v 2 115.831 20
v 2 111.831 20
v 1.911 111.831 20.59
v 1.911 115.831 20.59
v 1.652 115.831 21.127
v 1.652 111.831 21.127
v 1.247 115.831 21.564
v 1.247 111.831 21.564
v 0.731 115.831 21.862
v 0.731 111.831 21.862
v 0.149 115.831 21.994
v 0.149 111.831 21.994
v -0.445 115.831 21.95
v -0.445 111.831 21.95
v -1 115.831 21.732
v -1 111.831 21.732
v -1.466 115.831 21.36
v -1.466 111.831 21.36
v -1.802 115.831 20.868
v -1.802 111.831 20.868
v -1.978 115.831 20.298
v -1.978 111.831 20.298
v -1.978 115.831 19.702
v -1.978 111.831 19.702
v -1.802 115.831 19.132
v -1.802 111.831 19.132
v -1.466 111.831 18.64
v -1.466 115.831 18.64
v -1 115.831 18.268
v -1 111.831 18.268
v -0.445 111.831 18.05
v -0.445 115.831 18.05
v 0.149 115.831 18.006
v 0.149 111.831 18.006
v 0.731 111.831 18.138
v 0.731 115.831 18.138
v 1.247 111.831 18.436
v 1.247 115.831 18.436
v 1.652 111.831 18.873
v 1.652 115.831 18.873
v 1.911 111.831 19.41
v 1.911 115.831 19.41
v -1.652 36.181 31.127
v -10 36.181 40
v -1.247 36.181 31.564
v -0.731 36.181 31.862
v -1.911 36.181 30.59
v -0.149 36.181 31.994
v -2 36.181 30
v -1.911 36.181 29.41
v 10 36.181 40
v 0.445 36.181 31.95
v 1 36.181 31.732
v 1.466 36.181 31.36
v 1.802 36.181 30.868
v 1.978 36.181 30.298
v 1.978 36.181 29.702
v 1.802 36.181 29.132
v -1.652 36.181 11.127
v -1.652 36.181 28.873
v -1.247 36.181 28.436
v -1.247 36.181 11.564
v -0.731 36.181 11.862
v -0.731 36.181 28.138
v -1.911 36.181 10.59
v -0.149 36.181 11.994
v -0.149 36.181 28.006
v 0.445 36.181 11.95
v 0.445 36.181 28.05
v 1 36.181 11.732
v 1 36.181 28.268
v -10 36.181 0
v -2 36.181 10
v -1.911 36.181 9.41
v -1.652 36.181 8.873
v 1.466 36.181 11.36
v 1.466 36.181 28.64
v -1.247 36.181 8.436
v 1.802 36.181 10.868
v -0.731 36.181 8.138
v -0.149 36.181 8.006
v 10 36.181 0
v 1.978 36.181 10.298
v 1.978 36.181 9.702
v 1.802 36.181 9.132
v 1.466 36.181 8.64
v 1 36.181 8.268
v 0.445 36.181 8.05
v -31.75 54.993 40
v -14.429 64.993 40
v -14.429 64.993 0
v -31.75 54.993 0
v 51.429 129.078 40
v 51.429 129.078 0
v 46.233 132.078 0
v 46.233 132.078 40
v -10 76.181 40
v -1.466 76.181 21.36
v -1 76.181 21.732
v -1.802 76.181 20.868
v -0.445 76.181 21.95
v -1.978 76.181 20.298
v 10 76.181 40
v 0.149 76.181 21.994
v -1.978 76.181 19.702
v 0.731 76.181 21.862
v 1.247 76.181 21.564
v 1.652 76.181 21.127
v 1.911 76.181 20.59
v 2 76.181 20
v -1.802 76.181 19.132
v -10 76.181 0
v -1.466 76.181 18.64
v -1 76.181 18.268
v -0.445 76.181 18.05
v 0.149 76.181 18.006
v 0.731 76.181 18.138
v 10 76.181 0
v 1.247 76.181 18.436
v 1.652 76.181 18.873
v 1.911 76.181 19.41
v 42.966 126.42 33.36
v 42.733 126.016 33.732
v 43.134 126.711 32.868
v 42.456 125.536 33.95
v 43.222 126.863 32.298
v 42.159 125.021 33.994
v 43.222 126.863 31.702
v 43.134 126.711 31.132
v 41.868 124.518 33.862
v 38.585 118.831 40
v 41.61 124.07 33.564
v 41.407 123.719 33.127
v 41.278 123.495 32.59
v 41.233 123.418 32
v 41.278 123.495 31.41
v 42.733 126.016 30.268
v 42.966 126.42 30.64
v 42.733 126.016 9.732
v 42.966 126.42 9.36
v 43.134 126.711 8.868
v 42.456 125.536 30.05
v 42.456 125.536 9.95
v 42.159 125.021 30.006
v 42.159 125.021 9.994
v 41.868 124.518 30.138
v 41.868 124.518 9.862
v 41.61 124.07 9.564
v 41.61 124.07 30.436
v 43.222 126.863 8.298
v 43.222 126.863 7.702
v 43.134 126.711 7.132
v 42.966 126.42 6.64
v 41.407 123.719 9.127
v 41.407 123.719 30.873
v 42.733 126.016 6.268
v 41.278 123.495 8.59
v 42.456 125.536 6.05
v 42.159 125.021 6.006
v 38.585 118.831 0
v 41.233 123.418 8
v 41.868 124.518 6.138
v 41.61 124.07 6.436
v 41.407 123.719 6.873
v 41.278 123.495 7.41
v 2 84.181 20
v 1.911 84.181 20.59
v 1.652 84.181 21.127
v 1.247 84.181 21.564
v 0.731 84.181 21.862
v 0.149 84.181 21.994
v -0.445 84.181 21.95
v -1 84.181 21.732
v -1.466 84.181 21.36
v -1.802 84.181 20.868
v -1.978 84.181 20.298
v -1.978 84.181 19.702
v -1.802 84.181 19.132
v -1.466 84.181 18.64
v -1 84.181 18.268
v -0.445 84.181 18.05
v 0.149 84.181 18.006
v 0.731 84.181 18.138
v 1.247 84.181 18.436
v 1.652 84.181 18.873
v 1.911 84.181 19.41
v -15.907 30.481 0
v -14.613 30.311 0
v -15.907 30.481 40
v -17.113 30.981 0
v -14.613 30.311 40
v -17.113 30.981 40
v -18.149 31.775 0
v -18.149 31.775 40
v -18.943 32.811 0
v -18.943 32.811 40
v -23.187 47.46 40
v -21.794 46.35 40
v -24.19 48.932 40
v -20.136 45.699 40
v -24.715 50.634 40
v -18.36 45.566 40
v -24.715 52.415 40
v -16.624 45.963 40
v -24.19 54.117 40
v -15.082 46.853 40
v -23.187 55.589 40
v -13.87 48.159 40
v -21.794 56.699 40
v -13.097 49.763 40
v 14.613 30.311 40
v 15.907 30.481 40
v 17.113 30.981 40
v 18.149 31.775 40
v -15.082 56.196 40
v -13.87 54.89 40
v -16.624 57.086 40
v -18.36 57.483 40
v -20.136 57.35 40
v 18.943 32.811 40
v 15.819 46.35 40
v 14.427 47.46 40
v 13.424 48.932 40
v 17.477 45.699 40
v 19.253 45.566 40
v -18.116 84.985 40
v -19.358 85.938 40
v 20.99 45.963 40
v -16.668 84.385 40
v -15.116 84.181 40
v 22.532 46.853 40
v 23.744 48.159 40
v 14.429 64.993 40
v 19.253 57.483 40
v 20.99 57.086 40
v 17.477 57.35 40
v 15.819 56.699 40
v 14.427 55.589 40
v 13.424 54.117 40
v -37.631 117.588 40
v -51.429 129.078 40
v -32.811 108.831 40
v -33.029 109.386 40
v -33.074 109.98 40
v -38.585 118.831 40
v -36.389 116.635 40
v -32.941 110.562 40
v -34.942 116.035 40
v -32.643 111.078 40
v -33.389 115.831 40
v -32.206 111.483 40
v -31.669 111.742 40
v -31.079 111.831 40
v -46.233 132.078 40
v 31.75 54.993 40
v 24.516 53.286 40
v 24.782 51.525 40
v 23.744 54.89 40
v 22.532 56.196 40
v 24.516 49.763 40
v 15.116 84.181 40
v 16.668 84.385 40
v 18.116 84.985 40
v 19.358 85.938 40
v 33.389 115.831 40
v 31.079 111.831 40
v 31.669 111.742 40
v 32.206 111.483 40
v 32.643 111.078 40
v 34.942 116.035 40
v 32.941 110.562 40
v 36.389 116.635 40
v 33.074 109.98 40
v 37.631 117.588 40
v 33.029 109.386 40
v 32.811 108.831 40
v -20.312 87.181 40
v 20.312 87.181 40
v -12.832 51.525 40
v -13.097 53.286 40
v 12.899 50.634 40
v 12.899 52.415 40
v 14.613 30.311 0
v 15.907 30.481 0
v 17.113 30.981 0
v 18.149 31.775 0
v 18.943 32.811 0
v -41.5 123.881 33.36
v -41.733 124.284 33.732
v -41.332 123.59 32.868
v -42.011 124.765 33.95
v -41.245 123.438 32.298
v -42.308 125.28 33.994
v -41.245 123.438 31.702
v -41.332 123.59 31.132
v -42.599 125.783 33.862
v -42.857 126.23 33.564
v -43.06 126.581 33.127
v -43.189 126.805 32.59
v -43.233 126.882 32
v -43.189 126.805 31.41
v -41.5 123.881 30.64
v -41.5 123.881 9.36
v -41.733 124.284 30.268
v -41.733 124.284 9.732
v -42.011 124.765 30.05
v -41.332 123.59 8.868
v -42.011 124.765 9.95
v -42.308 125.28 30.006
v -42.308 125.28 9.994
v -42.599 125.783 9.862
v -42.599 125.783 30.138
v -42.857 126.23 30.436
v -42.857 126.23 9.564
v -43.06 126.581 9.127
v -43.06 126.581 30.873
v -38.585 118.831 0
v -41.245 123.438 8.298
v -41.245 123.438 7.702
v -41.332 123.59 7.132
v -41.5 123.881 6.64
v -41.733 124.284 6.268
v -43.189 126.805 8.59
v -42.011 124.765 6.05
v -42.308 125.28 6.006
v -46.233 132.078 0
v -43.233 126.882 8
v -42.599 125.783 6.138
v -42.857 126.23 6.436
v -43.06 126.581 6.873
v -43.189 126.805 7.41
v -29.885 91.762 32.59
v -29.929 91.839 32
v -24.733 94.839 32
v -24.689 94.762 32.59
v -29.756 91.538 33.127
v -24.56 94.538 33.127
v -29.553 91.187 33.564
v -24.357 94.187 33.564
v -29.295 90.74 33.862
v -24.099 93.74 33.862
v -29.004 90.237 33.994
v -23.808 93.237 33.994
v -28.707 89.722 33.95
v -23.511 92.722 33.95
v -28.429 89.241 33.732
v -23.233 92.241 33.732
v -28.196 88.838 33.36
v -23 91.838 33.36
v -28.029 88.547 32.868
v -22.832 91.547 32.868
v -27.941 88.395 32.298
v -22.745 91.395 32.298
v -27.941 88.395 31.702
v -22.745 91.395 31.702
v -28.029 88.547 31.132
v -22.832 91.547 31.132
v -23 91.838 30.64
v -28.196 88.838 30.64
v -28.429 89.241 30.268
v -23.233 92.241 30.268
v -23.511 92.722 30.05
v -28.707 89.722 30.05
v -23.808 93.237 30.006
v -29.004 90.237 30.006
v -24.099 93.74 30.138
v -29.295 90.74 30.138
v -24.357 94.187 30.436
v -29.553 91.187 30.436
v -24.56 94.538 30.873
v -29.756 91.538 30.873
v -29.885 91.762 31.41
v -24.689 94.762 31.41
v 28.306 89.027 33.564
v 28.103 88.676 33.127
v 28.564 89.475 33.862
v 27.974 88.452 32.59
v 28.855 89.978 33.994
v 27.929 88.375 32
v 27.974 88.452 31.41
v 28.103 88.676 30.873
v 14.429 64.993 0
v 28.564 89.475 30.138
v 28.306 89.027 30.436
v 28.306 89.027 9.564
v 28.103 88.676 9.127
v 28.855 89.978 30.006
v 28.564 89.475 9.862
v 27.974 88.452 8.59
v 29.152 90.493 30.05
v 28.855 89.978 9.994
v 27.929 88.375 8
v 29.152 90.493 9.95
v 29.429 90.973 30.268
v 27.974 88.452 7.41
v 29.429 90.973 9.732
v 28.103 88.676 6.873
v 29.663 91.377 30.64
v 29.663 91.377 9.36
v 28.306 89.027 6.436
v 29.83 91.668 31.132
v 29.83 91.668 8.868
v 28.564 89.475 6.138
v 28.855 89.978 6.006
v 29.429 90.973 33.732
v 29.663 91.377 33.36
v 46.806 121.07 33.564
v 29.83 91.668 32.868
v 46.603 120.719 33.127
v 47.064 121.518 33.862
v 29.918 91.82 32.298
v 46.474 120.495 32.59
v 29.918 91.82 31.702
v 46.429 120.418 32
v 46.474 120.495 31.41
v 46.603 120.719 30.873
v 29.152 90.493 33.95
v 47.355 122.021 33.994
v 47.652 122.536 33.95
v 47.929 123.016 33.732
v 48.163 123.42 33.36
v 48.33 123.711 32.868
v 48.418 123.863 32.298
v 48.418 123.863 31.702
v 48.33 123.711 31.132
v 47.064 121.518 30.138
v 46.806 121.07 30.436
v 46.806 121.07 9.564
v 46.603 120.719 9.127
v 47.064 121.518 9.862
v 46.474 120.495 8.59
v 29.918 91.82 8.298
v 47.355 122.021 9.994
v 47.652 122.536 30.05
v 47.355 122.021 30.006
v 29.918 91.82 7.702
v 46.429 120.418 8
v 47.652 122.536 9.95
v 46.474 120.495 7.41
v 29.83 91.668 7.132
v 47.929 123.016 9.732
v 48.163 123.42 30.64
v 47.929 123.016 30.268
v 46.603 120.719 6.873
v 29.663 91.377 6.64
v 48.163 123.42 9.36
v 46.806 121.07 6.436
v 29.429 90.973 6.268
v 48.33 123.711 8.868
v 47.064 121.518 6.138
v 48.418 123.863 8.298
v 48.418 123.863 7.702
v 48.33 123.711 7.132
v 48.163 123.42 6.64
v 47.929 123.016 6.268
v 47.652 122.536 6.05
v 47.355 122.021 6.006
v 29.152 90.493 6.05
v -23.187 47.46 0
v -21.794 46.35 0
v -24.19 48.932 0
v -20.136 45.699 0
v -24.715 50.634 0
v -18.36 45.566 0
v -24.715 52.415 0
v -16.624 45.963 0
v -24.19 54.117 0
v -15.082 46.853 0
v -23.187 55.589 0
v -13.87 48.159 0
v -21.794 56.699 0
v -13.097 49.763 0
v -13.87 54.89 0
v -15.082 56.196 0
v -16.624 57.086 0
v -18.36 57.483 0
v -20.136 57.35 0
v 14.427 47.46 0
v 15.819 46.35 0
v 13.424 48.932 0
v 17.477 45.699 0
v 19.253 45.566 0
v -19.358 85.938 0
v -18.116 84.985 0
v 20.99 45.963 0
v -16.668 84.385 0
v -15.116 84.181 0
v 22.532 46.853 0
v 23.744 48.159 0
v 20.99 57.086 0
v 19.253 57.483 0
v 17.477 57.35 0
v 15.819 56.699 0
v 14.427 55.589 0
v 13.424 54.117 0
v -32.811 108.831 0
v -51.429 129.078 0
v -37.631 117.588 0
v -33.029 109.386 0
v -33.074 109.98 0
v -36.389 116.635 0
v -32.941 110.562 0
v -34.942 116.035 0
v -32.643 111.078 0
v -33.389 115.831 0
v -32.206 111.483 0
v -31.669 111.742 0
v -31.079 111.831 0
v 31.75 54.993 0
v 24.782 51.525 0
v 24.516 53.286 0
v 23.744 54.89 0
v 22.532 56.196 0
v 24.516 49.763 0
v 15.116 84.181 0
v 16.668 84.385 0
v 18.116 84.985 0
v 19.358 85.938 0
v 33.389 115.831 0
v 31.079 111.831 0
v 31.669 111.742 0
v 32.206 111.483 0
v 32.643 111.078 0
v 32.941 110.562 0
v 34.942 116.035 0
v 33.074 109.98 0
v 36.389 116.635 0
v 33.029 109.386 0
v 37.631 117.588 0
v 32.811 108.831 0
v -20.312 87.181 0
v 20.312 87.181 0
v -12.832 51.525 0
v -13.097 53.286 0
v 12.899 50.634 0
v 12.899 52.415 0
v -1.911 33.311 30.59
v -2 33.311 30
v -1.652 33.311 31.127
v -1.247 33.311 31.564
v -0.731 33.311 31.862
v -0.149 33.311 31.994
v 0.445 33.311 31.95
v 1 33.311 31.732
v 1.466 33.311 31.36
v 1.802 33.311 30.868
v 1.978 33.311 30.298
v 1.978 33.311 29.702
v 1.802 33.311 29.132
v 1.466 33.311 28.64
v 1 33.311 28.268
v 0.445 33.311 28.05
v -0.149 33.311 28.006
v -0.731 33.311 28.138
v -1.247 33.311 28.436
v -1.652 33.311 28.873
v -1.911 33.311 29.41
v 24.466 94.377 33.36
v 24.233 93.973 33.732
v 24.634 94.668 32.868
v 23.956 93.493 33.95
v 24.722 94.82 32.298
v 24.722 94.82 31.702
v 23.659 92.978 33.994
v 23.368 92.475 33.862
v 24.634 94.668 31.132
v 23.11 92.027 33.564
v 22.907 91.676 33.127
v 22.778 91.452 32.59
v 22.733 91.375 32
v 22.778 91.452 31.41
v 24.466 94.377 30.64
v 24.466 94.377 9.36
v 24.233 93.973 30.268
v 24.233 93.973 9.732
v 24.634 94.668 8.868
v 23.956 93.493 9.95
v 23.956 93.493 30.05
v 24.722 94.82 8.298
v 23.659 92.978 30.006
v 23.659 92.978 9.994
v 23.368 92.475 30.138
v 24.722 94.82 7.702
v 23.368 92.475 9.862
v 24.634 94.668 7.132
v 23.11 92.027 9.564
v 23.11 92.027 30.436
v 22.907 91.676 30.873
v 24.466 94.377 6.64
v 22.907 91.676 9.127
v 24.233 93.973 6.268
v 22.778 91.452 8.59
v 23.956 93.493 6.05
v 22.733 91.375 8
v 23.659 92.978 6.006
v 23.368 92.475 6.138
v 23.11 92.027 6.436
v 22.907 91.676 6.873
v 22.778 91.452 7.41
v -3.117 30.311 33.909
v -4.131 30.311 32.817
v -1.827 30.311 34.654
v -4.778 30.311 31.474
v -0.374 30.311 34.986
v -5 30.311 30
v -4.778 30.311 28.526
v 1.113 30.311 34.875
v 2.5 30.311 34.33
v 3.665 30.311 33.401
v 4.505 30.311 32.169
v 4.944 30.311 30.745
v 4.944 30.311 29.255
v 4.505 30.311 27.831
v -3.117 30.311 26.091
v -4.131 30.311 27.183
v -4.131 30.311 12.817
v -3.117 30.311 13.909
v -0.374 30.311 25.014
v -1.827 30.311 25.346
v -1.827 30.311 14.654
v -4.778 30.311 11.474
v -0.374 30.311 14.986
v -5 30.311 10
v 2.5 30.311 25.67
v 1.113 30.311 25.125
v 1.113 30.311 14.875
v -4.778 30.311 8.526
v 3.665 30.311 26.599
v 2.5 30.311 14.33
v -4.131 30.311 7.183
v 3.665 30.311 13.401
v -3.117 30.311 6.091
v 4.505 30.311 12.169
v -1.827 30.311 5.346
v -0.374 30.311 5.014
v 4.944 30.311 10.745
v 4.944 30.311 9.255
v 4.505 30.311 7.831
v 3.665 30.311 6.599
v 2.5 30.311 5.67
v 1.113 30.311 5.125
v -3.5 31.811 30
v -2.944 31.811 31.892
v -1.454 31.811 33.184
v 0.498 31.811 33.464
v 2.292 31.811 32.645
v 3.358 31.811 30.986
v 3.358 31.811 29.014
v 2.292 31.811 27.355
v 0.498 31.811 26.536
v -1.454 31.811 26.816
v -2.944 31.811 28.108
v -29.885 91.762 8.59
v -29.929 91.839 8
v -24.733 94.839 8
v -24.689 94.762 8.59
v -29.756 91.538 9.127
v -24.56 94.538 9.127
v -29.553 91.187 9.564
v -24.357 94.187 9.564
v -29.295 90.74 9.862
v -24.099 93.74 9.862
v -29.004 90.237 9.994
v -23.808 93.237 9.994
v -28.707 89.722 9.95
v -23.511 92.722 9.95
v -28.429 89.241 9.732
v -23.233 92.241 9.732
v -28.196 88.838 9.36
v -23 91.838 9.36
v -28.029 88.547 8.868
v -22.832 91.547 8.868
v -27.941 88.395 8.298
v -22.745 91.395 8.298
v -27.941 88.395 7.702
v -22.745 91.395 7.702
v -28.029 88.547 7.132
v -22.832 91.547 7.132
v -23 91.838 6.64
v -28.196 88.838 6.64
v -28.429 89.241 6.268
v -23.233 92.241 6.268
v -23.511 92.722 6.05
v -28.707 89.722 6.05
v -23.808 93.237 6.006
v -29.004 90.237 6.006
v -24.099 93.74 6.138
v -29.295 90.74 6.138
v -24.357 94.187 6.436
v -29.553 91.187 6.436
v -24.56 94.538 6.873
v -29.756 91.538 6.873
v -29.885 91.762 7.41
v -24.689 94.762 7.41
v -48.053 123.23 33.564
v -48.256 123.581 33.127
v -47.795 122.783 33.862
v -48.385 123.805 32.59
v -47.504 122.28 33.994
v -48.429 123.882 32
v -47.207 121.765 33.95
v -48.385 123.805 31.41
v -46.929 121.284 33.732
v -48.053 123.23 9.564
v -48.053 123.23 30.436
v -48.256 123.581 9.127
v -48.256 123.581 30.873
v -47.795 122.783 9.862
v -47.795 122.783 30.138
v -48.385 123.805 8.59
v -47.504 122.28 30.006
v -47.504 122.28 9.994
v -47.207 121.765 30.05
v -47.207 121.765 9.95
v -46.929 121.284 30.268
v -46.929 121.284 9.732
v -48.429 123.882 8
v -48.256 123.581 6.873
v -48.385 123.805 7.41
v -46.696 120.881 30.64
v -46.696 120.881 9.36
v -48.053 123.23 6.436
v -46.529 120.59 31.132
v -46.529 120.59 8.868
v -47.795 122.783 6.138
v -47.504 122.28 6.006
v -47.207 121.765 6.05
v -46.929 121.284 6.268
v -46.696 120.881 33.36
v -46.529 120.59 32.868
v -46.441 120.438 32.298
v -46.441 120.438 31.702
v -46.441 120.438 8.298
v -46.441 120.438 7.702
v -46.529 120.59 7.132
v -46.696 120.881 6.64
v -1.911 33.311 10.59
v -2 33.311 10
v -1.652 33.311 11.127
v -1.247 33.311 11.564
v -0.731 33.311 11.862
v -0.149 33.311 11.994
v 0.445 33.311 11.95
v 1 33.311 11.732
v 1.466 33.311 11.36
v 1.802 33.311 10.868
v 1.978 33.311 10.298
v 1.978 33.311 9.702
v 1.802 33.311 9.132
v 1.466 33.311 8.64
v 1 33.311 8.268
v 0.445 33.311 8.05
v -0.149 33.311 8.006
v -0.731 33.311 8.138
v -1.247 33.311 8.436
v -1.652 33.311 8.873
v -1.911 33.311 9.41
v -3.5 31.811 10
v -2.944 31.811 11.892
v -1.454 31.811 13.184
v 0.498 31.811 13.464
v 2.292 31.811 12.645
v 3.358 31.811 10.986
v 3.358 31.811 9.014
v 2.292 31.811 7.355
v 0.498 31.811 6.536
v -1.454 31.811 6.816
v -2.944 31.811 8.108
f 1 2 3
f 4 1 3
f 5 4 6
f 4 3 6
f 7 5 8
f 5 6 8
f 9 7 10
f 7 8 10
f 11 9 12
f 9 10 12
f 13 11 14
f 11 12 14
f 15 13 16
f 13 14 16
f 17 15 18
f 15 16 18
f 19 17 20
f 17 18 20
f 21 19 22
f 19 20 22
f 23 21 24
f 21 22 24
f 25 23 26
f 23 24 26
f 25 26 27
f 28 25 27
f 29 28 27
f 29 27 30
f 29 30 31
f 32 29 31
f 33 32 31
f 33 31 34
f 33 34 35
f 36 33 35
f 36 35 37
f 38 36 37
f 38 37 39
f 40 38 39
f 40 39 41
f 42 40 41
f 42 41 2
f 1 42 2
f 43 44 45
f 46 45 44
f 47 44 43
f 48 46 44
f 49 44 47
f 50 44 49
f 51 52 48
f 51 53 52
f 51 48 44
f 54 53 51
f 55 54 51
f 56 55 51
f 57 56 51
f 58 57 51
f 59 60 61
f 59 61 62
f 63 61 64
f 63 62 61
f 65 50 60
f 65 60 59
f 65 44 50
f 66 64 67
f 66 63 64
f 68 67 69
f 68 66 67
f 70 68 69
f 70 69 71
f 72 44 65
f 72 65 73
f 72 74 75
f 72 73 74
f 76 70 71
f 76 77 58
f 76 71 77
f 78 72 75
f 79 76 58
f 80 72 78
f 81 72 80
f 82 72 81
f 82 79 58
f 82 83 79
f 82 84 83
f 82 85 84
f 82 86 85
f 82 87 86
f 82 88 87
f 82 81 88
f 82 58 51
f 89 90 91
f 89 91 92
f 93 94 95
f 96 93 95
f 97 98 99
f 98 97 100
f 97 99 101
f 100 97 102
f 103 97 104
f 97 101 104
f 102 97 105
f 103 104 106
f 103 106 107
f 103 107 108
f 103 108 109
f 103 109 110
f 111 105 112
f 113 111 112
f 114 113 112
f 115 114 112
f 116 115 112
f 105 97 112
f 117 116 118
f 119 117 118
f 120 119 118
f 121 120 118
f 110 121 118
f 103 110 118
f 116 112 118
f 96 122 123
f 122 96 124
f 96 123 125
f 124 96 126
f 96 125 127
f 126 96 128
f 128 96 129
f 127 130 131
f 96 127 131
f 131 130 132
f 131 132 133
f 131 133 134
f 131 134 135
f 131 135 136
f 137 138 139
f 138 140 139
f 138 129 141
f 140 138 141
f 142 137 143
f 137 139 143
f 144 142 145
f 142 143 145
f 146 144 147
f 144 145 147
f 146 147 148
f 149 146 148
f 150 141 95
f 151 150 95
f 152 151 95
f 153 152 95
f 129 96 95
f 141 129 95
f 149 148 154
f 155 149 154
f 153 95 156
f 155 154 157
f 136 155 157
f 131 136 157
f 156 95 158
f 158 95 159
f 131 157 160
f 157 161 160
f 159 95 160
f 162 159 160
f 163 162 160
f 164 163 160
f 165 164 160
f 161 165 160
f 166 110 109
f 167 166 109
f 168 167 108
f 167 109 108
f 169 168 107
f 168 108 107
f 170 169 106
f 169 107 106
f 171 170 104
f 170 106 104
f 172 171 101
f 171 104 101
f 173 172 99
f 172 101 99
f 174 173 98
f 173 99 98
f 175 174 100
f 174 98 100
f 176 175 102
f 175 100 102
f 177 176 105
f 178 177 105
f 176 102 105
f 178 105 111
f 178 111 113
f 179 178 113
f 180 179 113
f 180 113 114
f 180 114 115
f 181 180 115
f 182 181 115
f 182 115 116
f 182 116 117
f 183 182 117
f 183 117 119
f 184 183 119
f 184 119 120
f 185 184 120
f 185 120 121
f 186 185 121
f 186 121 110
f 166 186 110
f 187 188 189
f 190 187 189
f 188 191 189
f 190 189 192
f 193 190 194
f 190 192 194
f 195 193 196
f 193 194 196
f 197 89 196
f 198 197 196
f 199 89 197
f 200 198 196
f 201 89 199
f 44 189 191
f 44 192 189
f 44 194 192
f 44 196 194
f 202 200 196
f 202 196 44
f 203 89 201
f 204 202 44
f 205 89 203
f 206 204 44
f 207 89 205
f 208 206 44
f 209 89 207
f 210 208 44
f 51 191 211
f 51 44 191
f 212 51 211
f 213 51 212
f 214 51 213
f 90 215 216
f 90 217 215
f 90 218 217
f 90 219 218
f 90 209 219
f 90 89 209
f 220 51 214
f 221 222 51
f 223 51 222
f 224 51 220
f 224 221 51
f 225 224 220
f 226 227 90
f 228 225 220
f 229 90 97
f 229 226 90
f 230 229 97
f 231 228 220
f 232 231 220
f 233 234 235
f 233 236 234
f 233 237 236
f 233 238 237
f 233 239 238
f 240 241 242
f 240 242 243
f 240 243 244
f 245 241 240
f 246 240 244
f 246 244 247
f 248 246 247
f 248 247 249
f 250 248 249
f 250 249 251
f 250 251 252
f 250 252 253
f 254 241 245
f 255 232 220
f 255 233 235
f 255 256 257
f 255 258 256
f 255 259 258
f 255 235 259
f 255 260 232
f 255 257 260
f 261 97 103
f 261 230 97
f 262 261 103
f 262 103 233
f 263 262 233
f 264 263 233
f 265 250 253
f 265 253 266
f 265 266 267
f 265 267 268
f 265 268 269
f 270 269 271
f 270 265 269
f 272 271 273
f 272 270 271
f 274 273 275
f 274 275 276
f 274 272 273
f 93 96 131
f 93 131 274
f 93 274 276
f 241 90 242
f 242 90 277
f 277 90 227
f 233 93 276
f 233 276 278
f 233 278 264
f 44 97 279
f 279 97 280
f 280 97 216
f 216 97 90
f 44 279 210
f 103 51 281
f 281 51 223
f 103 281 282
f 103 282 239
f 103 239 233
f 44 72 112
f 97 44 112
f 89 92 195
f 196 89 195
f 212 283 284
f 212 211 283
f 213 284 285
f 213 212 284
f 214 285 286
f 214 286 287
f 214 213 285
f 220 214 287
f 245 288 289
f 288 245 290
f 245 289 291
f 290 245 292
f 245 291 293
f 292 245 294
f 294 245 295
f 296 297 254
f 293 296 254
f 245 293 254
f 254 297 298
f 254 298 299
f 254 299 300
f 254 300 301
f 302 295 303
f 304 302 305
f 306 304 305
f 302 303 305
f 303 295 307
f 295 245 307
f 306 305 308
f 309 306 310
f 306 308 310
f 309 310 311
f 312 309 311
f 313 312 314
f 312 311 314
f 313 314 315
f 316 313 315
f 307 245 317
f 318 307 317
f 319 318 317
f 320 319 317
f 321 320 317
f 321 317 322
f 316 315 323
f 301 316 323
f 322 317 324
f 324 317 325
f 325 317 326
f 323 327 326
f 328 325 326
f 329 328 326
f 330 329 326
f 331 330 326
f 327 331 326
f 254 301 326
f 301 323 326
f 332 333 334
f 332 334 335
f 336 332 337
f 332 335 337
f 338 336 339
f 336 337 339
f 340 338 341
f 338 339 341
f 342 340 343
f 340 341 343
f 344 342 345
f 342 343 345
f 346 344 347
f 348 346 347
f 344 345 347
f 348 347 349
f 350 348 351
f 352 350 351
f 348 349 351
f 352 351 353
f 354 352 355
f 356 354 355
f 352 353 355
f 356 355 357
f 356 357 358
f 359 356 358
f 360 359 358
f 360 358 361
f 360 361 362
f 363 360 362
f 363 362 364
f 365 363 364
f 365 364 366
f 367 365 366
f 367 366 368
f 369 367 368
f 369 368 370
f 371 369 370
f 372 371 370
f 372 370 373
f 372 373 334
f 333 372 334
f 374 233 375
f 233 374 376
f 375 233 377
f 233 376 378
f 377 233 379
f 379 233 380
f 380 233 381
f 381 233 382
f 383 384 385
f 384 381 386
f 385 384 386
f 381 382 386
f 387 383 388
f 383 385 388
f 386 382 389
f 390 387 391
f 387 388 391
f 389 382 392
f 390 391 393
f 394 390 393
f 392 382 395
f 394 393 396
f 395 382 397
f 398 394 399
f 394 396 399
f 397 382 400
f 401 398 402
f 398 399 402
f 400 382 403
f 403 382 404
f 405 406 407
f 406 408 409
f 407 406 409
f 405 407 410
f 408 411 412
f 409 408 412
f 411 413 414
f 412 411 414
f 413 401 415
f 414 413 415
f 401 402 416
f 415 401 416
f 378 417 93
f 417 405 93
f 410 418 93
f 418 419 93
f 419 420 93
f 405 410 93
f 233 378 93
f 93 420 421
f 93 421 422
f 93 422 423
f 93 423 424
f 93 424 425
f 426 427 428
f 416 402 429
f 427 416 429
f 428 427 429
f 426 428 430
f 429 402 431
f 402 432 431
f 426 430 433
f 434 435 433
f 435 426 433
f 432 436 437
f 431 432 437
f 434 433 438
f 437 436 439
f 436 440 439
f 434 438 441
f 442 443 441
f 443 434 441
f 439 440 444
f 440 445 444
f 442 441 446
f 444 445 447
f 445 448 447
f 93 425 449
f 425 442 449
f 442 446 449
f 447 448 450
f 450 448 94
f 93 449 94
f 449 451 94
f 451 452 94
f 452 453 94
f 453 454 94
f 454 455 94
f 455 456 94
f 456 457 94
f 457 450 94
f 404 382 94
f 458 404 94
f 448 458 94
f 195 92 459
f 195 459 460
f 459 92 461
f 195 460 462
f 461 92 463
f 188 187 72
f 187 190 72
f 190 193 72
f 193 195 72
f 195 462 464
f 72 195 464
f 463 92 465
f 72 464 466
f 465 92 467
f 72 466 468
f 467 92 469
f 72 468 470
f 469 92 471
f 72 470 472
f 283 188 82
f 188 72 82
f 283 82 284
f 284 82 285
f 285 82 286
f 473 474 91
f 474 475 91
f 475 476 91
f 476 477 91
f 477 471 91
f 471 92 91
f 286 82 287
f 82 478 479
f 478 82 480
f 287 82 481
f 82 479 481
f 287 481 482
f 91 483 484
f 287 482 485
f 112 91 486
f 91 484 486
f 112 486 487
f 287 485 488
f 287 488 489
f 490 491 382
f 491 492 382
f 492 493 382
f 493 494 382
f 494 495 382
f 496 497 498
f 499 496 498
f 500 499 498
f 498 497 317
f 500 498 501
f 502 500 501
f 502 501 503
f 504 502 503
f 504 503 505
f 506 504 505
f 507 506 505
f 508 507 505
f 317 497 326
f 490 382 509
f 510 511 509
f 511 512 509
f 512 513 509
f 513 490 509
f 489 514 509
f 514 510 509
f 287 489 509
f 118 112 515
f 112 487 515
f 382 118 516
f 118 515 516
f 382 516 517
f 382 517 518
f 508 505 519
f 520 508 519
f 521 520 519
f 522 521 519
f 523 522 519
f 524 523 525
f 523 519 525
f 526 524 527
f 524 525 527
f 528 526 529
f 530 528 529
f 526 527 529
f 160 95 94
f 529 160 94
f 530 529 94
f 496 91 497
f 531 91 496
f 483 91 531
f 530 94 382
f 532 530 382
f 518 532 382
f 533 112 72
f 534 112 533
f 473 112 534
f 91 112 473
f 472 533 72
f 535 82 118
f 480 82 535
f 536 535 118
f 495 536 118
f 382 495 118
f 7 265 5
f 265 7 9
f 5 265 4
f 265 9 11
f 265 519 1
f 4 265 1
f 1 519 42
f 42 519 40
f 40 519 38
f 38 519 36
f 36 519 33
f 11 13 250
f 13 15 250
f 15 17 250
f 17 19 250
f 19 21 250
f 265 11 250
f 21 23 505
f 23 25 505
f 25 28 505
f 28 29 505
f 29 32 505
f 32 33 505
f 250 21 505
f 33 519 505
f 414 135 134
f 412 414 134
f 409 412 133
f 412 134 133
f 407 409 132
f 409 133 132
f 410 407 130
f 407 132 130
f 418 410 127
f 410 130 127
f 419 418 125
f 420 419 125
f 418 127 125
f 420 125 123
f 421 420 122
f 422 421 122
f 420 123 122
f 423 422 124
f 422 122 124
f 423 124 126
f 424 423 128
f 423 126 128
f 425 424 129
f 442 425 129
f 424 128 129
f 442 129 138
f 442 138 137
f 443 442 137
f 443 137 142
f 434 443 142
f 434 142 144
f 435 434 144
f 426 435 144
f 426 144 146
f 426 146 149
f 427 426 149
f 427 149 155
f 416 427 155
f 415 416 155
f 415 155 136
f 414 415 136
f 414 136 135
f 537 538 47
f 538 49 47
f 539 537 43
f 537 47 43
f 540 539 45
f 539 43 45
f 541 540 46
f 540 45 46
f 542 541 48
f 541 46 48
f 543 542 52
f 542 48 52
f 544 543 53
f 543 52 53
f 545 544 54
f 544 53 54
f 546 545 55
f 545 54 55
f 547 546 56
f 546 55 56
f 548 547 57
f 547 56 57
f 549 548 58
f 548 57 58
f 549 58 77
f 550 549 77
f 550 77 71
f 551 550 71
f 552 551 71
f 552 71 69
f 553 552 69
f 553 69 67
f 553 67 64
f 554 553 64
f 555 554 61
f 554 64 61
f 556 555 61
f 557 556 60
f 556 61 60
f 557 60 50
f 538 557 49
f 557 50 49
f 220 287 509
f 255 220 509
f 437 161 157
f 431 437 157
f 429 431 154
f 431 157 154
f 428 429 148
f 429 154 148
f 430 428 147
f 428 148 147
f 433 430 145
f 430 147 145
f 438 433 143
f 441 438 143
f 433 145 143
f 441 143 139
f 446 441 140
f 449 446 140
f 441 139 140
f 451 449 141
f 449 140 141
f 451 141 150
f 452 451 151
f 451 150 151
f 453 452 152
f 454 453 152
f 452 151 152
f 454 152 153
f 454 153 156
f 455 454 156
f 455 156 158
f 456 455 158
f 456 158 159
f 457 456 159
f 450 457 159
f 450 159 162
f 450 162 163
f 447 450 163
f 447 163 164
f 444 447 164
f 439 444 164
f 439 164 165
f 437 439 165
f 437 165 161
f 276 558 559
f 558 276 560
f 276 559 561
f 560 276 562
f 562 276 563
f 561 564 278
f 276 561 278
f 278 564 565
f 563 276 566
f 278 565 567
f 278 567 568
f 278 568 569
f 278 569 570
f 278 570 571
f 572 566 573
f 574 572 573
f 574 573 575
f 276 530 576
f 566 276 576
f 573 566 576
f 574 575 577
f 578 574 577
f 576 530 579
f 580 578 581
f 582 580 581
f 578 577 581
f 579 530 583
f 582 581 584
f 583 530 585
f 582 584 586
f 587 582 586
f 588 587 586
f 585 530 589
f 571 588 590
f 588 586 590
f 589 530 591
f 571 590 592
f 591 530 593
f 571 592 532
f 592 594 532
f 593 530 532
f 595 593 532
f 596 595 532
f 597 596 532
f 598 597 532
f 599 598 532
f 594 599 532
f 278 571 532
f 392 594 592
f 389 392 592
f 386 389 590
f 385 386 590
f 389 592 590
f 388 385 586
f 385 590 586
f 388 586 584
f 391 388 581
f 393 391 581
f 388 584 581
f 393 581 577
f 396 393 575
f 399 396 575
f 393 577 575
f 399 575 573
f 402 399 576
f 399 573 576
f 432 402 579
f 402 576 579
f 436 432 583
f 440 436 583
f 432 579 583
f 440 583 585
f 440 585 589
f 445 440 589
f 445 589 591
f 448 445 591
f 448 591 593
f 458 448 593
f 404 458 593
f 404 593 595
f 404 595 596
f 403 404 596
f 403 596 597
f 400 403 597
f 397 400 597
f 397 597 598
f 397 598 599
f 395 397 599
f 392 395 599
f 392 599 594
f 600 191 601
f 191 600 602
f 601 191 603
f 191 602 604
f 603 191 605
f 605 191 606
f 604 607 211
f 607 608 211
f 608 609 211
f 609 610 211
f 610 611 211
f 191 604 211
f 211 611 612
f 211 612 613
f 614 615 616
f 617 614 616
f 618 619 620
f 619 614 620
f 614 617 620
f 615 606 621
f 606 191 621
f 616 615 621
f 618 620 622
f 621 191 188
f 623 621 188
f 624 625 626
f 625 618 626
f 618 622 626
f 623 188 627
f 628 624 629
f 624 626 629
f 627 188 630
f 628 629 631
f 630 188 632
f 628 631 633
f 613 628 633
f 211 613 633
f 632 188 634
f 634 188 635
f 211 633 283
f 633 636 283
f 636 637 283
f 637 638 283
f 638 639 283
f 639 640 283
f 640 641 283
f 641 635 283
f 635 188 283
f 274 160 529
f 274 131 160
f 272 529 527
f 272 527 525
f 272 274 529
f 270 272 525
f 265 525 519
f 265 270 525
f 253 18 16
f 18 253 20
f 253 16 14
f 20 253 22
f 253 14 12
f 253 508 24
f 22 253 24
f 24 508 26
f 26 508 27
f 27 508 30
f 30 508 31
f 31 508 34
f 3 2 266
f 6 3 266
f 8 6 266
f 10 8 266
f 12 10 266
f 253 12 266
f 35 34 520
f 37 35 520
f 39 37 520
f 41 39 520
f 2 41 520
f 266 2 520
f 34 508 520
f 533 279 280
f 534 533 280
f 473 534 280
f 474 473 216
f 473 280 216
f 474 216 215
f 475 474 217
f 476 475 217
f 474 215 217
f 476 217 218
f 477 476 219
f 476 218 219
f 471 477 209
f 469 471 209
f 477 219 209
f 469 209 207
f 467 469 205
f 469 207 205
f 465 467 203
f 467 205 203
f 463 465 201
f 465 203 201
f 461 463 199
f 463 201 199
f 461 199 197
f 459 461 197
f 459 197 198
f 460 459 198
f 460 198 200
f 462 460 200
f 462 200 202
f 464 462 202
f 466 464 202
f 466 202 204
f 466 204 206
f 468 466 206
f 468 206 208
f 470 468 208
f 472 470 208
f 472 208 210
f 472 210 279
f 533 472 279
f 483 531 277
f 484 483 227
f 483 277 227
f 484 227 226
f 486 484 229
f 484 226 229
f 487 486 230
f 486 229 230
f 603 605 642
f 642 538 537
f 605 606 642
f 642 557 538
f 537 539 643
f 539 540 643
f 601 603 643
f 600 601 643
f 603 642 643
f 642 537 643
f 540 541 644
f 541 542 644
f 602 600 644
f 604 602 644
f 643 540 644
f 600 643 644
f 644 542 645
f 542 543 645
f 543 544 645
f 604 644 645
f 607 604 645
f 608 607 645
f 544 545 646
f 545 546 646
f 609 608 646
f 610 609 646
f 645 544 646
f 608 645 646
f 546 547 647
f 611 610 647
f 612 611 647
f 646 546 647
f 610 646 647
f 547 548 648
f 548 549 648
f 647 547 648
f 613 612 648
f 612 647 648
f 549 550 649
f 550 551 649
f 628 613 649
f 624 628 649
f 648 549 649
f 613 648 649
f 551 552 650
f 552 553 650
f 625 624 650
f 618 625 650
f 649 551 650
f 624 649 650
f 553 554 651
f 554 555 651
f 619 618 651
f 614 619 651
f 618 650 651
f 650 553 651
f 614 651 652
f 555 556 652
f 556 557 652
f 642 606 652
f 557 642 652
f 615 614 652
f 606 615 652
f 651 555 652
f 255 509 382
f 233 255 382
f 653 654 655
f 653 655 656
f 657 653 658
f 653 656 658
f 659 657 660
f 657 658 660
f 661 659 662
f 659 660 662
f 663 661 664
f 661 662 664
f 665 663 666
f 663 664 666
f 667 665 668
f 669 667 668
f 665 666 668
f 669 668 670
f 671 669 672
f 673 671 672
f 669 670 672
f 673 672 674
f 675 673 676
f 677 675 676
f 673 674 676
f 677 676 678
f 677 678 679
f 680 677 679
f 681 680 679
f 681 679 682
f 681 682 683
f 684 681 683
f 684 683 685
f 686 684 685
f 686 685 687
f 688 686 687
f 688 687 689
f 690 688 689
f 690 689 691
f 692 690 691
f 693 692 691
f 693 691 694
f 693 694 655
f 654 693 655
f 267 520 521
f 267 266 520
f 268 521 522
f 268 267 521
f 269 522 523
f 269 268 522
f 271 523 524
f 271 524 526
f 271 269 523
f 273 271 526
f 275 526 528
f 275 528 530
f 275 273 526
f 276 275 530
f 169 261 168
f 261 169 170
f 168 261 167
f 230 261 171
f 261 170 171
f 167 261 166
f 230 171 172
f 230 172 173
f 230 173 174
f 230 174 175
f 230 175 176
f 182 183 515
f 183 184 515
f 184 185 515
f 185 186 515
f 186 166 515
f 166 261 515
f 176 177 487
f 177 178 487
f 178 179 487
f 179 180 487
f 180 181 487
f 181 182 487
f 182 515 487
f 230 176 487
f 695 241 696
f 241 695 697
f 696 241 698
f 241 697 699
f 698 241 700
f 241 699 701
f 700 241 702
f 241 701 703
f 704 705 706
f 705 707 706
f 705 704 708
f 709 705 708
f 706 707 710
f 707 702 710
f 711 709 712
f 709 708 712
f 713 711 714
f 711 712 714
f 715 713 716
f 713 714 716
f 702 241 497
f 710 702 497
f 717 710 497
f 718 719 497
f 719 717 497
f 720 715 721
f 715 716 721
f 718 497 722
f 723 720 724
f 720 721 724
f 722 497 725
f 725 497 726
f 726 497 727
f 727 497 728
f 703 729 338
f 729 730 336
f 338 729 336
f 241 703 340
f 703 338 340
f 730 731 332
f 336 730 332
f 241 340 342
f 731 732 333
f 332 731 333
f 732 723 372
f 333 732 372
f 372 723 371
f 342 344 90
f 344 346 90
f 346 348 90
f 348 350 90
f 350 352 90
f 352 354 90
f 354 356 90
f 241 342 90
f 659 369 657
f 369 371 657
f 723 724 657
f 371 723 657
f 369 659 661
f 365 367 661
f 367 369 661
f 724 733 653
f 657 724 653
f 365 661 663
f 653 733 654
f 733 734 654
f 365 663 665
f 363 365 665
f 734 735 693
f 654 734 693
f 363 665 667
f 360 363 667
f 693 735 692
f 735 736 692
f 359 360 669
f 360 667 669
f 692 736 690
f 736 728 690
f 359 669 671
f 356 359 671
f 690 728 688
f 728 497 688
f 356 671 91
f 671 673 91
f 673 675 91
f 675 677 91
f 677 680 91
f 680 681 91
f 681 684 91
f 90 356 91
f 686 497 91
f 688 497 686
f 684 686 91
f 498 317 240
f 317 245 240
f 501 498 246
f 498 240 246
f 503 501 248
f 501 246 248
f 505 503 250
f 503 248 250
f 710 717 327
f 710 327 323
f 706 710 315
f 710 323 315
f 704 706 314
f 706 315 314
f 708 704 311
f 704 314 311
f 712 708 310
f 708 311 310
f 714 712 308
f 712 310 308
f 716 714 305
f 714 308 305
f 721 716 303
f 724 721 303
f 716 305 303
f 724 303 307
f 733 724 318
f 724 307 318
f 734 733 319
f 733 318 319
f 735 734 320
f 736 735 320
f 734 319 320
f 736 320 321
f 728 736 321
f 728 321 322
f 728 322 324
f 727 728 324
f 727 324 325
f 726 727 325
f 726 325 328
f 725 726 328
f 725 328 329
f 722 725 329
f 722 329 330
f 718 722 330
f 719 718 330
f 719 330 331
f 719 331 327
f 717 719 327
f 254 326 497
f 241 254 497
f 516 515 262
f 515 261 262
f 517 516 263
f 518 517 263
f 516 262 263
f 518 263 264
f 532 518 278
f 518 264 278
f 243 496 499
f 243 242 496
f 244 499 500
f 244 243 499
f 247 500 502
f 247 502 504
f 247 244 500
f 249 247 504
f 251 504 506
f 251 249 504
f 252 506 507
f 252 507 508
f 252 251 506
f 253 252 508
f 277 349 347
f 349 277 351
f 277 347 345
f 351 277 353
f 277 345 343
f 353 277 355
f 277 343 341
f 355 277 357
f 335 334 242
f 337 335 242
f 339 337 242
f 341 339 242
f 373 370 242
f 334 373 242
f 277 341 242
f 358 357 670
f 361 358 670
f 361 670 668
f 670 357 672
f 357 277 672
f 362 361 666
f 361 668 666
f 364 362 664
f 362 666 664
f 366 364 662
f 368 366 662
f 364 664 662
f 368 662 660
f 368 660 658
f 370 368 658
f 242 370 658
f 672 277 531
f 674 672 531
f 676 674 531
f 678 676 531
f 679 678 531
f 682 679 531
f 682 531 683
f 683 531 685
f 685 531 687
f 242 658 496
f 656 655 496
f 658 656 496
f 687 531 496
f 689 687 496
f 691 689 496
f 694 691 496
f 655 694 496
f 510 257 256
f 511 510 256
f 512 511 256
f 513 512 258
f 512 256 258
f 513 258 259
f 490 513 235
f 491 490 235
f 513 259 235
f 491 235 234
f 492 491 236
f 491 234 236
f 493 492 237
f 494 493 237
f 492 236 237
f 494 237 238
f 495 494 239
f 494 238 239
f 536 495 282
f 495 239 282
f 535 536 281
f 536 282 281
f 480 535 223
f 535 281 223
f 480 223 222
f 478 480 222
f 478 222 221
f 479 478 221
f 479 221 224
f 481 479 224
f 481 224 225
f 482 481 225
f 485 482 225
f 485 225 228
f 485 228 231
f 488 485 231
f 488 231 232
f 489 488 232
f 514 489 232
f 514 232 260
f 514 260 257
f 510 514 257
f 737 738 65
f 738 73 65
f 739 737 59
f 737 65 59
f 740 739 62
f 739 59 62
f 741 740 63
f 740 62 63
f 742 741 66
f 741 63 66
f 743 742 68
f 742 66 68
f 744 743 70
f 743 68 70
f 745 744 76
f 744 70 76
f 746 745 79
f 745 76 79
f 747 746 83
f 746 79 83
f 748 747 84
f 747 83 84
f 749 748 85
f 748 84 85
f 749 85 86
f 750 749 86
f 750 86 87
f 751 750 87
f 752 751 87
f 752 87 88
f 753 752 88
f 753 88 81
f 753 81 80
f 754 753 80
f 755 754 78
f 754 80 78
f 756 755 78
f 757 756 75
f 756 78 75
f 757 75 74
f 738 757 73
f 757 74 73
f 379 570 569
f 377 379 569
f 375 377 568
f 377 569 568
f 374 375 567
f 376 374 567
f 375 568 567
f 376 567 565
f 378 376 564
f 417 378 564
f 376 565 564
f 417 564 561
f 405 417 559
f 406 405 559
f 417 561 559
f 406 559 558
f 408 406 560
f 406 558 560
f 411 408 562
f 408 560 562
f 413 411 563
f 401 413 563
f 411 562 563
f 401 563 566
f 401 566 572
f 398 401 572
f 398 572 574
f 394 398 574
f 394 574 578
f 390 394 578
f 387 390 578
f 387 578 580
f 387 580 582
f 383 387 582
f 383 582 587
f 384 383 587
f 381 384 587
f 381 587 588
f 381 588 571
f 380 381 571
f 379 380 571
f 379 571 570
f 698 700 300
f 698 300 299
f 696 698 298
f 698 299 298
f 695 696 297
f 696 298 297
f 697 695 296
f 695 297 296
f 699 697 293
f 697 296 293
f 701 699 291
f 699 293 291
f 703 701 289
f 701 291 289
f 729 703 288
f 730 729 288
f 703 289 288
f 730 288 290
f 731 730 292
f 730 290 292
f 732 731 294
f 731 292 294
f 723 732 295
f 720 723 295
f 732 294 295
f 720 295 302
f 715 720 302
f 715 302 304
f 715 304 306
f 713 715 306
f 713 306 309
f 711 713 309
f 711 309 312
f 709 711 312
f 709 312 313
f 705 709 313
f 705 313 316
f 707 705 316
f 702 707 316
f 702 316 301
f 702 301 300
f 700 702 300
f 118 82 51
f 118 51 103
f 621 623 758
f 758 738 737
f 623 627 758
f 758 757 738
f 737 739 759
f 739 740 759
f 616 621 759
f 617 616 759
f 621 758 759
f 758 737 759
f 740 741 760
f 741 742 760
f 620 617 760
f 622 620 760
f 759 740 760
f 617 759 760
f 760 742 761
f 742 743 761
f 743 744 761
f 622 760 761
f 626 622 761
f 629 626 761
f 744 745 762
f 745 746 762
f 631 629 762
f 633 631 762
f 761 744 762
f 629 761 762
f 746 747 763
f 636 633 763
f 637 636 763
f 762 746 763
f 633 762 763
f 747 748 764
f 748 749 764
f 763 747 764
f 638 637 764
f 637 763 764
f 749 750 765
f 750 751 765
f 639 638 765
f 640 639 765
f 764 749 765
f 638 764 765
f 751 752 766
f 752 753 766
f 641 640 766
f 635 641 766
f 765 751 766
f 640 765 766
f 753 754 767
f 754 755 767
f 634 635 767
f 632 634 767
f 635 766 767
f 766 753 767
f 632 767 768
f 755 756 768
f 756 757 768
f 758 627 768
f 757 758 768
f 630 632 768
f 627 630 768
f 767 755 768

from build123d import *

# Parameters (mm, degrees)
F0_W            = 20
F0_H            = 40
F1_DEPTH        = 40
F2_R            = 5
F3_R            = 6
F4_R            = 2
F5_R            = 5.975
F6_DEPTH        = 40.001
F8_D            = 4
F8_DEPTH        = 40
F8_TIP          = 1.2017212381
F10_D           = 4
F10_DEPTH       = 12
F10_TIP         = 1.2017212381
F12_D           = 4
F12_DEPTH       = 12
F12_TIP         = 1.2017212381
F14_D           = 4
F14_DEPTH       = 12
F14_CSINK_D     = 10
F14_CSINK_ANGLE = 90
F14_TIP         = 1.2017212381


with BuildPart() as f1:
    # F0 (on Top) → F1 (new body)
    with BuildSketch(Plane.XY):
        Polygon((-17.5, 30.3108891325), (17.5, 30.3108891325), (31.75, 54.9926131403), (14.4294919243, 64.9926131403), (51.4294919243, 129.0784930204), (46.2333395016, 132.0784930204), (36.8527810232, 115.8308891325), (-36.8527810232, 115.8308891325), (-46.2333395016, 132.0784930204), (-51.4294919243, 129.0784930204), (-14.4294919243, 64.9926131403), (-31.75, 54.9926131403), align=None)
        with Locations((0, 56.1808891325)):
            Rectangle(F0_W, F0_H, mode=Mode.SUBTRACT)
        Polygon((34.5433799465, 111.8308891325), (18.5796450034, 84.1808891325), (-18.5796450034, 84.1808891325), (-34.5433799465, 111.8308891325), align=None, mode=Mode.SUBTRACT)
    extrude(amount=F1_DEPTH)

    # F2
    f2_edges = [f1.edges().sort_by_distance(p)[0] for p in [
        (-17.5, 30.310889, 20),
        (17.5, 30.310889, 20),
    ]]
    fillet(f2_edges, radius=F2_R)

    # F3
    f3_edges = [f1.edges().sort_by_distance(p)[0] for p in [
        (18.579645, 84.180889, 20),
        (-18.579645, 84.180889, 20),
        (-36.852781, 115.830889, 20),
        (36.852781, 115.830889, 20),
    ]]
    fillet(f3_edges, radius=F3_R)

    # F4
    f4_edges = [f1.edges().sort_by_distance(p)[0] for p in [
        (34.54338, 111.830889, 20),
        (-34.54338, 111.830889, 20),
    ]]
    fillet(f4_edges, radius=F4_R)

    # F5 (on face) → F6 (cut, through all)
    with BuildSketch(Plane.XY.offset(40)):
        with Locations((-18.8069092991, 51.5245224395)):
            Circle(F5_R)
        with Locations((18.8069092991, 51.5245224395)):
            Circle(F5_R)
    extrude(amount=-F6_DEPTH, mode=Mode.SUBTRACT)

    # F8
    with Locations(Plane(origin=(0, 115.8308891325, 0), x_dir=(-1, 0, 0), z_dir=(0, 1, 0))):
        with Locations((0, 20)):
            Hole(F8_D / 2, depth=F8_DEPTH)
            with Locations((0, 0, -(F8_DEPTH + F8_TIP / 2))):  # 118° drill point
                Cone(0, F8_D / 2, F8_TIP, mode=Mode.SUBTRACT)

    # F10
    with Locations(Plane(origin=(-17.3205080757, 10, 0), x_dir=(0.5, 0.8660254038, 0), z_dir=(0.8660254038, -0.5, 0))):
        with Locations((129.5, 32), (92.5, 32), (92.5, 8), (129.5, 8)):
            Hole(F10_D / 2, depth=F10_DEPTH)
            with Locations((0, 0, -(F10_DEPTH + F10_TIP / 2))):  # 118° drill point
                Cone(0, F10_D / 2, F10_TIP, mode=Mode.SUBTRACT)

    # F12
    with Locations(Plane(origin=(17.3205080757, 10, 0), x_dir=(0.5, -0.8660254038, 0), z_dir=(-0.8660254038, -0.5, 0))):
        with Locations((-129.5, 32), (-129.5, 8), (-92.5, 8), (-92.5, 32)):
            Hole(F12_D / 2, depth=F12_DEPTH)
            with Locations((0, 0, -(F12_DEPTH + F12_TIP / 2))):  # 118° drill point
                Cone(0, F12_D / 2, F12_TIP, mode=Mode.SUBTRACT)

    # F14
    with Locations(Plane.XZ.offset(-30.3108891325)):
        with Locations((0, 30), (0, 10)):
            CounterSinkHole(F14_D / 2, F14_CSINK_D / 2, depth=F14_DEPTH, counter_sink_angle=F14_CSINK_ANGLE)
            with Locations((0, 0, -(F14_DEPTH + F14_TIP / 2))):  # 118° drill point
                Cone(0, F14_D / 2, F14_TIP, mode=Mode.SUBTRACT)


solid = f1.part
